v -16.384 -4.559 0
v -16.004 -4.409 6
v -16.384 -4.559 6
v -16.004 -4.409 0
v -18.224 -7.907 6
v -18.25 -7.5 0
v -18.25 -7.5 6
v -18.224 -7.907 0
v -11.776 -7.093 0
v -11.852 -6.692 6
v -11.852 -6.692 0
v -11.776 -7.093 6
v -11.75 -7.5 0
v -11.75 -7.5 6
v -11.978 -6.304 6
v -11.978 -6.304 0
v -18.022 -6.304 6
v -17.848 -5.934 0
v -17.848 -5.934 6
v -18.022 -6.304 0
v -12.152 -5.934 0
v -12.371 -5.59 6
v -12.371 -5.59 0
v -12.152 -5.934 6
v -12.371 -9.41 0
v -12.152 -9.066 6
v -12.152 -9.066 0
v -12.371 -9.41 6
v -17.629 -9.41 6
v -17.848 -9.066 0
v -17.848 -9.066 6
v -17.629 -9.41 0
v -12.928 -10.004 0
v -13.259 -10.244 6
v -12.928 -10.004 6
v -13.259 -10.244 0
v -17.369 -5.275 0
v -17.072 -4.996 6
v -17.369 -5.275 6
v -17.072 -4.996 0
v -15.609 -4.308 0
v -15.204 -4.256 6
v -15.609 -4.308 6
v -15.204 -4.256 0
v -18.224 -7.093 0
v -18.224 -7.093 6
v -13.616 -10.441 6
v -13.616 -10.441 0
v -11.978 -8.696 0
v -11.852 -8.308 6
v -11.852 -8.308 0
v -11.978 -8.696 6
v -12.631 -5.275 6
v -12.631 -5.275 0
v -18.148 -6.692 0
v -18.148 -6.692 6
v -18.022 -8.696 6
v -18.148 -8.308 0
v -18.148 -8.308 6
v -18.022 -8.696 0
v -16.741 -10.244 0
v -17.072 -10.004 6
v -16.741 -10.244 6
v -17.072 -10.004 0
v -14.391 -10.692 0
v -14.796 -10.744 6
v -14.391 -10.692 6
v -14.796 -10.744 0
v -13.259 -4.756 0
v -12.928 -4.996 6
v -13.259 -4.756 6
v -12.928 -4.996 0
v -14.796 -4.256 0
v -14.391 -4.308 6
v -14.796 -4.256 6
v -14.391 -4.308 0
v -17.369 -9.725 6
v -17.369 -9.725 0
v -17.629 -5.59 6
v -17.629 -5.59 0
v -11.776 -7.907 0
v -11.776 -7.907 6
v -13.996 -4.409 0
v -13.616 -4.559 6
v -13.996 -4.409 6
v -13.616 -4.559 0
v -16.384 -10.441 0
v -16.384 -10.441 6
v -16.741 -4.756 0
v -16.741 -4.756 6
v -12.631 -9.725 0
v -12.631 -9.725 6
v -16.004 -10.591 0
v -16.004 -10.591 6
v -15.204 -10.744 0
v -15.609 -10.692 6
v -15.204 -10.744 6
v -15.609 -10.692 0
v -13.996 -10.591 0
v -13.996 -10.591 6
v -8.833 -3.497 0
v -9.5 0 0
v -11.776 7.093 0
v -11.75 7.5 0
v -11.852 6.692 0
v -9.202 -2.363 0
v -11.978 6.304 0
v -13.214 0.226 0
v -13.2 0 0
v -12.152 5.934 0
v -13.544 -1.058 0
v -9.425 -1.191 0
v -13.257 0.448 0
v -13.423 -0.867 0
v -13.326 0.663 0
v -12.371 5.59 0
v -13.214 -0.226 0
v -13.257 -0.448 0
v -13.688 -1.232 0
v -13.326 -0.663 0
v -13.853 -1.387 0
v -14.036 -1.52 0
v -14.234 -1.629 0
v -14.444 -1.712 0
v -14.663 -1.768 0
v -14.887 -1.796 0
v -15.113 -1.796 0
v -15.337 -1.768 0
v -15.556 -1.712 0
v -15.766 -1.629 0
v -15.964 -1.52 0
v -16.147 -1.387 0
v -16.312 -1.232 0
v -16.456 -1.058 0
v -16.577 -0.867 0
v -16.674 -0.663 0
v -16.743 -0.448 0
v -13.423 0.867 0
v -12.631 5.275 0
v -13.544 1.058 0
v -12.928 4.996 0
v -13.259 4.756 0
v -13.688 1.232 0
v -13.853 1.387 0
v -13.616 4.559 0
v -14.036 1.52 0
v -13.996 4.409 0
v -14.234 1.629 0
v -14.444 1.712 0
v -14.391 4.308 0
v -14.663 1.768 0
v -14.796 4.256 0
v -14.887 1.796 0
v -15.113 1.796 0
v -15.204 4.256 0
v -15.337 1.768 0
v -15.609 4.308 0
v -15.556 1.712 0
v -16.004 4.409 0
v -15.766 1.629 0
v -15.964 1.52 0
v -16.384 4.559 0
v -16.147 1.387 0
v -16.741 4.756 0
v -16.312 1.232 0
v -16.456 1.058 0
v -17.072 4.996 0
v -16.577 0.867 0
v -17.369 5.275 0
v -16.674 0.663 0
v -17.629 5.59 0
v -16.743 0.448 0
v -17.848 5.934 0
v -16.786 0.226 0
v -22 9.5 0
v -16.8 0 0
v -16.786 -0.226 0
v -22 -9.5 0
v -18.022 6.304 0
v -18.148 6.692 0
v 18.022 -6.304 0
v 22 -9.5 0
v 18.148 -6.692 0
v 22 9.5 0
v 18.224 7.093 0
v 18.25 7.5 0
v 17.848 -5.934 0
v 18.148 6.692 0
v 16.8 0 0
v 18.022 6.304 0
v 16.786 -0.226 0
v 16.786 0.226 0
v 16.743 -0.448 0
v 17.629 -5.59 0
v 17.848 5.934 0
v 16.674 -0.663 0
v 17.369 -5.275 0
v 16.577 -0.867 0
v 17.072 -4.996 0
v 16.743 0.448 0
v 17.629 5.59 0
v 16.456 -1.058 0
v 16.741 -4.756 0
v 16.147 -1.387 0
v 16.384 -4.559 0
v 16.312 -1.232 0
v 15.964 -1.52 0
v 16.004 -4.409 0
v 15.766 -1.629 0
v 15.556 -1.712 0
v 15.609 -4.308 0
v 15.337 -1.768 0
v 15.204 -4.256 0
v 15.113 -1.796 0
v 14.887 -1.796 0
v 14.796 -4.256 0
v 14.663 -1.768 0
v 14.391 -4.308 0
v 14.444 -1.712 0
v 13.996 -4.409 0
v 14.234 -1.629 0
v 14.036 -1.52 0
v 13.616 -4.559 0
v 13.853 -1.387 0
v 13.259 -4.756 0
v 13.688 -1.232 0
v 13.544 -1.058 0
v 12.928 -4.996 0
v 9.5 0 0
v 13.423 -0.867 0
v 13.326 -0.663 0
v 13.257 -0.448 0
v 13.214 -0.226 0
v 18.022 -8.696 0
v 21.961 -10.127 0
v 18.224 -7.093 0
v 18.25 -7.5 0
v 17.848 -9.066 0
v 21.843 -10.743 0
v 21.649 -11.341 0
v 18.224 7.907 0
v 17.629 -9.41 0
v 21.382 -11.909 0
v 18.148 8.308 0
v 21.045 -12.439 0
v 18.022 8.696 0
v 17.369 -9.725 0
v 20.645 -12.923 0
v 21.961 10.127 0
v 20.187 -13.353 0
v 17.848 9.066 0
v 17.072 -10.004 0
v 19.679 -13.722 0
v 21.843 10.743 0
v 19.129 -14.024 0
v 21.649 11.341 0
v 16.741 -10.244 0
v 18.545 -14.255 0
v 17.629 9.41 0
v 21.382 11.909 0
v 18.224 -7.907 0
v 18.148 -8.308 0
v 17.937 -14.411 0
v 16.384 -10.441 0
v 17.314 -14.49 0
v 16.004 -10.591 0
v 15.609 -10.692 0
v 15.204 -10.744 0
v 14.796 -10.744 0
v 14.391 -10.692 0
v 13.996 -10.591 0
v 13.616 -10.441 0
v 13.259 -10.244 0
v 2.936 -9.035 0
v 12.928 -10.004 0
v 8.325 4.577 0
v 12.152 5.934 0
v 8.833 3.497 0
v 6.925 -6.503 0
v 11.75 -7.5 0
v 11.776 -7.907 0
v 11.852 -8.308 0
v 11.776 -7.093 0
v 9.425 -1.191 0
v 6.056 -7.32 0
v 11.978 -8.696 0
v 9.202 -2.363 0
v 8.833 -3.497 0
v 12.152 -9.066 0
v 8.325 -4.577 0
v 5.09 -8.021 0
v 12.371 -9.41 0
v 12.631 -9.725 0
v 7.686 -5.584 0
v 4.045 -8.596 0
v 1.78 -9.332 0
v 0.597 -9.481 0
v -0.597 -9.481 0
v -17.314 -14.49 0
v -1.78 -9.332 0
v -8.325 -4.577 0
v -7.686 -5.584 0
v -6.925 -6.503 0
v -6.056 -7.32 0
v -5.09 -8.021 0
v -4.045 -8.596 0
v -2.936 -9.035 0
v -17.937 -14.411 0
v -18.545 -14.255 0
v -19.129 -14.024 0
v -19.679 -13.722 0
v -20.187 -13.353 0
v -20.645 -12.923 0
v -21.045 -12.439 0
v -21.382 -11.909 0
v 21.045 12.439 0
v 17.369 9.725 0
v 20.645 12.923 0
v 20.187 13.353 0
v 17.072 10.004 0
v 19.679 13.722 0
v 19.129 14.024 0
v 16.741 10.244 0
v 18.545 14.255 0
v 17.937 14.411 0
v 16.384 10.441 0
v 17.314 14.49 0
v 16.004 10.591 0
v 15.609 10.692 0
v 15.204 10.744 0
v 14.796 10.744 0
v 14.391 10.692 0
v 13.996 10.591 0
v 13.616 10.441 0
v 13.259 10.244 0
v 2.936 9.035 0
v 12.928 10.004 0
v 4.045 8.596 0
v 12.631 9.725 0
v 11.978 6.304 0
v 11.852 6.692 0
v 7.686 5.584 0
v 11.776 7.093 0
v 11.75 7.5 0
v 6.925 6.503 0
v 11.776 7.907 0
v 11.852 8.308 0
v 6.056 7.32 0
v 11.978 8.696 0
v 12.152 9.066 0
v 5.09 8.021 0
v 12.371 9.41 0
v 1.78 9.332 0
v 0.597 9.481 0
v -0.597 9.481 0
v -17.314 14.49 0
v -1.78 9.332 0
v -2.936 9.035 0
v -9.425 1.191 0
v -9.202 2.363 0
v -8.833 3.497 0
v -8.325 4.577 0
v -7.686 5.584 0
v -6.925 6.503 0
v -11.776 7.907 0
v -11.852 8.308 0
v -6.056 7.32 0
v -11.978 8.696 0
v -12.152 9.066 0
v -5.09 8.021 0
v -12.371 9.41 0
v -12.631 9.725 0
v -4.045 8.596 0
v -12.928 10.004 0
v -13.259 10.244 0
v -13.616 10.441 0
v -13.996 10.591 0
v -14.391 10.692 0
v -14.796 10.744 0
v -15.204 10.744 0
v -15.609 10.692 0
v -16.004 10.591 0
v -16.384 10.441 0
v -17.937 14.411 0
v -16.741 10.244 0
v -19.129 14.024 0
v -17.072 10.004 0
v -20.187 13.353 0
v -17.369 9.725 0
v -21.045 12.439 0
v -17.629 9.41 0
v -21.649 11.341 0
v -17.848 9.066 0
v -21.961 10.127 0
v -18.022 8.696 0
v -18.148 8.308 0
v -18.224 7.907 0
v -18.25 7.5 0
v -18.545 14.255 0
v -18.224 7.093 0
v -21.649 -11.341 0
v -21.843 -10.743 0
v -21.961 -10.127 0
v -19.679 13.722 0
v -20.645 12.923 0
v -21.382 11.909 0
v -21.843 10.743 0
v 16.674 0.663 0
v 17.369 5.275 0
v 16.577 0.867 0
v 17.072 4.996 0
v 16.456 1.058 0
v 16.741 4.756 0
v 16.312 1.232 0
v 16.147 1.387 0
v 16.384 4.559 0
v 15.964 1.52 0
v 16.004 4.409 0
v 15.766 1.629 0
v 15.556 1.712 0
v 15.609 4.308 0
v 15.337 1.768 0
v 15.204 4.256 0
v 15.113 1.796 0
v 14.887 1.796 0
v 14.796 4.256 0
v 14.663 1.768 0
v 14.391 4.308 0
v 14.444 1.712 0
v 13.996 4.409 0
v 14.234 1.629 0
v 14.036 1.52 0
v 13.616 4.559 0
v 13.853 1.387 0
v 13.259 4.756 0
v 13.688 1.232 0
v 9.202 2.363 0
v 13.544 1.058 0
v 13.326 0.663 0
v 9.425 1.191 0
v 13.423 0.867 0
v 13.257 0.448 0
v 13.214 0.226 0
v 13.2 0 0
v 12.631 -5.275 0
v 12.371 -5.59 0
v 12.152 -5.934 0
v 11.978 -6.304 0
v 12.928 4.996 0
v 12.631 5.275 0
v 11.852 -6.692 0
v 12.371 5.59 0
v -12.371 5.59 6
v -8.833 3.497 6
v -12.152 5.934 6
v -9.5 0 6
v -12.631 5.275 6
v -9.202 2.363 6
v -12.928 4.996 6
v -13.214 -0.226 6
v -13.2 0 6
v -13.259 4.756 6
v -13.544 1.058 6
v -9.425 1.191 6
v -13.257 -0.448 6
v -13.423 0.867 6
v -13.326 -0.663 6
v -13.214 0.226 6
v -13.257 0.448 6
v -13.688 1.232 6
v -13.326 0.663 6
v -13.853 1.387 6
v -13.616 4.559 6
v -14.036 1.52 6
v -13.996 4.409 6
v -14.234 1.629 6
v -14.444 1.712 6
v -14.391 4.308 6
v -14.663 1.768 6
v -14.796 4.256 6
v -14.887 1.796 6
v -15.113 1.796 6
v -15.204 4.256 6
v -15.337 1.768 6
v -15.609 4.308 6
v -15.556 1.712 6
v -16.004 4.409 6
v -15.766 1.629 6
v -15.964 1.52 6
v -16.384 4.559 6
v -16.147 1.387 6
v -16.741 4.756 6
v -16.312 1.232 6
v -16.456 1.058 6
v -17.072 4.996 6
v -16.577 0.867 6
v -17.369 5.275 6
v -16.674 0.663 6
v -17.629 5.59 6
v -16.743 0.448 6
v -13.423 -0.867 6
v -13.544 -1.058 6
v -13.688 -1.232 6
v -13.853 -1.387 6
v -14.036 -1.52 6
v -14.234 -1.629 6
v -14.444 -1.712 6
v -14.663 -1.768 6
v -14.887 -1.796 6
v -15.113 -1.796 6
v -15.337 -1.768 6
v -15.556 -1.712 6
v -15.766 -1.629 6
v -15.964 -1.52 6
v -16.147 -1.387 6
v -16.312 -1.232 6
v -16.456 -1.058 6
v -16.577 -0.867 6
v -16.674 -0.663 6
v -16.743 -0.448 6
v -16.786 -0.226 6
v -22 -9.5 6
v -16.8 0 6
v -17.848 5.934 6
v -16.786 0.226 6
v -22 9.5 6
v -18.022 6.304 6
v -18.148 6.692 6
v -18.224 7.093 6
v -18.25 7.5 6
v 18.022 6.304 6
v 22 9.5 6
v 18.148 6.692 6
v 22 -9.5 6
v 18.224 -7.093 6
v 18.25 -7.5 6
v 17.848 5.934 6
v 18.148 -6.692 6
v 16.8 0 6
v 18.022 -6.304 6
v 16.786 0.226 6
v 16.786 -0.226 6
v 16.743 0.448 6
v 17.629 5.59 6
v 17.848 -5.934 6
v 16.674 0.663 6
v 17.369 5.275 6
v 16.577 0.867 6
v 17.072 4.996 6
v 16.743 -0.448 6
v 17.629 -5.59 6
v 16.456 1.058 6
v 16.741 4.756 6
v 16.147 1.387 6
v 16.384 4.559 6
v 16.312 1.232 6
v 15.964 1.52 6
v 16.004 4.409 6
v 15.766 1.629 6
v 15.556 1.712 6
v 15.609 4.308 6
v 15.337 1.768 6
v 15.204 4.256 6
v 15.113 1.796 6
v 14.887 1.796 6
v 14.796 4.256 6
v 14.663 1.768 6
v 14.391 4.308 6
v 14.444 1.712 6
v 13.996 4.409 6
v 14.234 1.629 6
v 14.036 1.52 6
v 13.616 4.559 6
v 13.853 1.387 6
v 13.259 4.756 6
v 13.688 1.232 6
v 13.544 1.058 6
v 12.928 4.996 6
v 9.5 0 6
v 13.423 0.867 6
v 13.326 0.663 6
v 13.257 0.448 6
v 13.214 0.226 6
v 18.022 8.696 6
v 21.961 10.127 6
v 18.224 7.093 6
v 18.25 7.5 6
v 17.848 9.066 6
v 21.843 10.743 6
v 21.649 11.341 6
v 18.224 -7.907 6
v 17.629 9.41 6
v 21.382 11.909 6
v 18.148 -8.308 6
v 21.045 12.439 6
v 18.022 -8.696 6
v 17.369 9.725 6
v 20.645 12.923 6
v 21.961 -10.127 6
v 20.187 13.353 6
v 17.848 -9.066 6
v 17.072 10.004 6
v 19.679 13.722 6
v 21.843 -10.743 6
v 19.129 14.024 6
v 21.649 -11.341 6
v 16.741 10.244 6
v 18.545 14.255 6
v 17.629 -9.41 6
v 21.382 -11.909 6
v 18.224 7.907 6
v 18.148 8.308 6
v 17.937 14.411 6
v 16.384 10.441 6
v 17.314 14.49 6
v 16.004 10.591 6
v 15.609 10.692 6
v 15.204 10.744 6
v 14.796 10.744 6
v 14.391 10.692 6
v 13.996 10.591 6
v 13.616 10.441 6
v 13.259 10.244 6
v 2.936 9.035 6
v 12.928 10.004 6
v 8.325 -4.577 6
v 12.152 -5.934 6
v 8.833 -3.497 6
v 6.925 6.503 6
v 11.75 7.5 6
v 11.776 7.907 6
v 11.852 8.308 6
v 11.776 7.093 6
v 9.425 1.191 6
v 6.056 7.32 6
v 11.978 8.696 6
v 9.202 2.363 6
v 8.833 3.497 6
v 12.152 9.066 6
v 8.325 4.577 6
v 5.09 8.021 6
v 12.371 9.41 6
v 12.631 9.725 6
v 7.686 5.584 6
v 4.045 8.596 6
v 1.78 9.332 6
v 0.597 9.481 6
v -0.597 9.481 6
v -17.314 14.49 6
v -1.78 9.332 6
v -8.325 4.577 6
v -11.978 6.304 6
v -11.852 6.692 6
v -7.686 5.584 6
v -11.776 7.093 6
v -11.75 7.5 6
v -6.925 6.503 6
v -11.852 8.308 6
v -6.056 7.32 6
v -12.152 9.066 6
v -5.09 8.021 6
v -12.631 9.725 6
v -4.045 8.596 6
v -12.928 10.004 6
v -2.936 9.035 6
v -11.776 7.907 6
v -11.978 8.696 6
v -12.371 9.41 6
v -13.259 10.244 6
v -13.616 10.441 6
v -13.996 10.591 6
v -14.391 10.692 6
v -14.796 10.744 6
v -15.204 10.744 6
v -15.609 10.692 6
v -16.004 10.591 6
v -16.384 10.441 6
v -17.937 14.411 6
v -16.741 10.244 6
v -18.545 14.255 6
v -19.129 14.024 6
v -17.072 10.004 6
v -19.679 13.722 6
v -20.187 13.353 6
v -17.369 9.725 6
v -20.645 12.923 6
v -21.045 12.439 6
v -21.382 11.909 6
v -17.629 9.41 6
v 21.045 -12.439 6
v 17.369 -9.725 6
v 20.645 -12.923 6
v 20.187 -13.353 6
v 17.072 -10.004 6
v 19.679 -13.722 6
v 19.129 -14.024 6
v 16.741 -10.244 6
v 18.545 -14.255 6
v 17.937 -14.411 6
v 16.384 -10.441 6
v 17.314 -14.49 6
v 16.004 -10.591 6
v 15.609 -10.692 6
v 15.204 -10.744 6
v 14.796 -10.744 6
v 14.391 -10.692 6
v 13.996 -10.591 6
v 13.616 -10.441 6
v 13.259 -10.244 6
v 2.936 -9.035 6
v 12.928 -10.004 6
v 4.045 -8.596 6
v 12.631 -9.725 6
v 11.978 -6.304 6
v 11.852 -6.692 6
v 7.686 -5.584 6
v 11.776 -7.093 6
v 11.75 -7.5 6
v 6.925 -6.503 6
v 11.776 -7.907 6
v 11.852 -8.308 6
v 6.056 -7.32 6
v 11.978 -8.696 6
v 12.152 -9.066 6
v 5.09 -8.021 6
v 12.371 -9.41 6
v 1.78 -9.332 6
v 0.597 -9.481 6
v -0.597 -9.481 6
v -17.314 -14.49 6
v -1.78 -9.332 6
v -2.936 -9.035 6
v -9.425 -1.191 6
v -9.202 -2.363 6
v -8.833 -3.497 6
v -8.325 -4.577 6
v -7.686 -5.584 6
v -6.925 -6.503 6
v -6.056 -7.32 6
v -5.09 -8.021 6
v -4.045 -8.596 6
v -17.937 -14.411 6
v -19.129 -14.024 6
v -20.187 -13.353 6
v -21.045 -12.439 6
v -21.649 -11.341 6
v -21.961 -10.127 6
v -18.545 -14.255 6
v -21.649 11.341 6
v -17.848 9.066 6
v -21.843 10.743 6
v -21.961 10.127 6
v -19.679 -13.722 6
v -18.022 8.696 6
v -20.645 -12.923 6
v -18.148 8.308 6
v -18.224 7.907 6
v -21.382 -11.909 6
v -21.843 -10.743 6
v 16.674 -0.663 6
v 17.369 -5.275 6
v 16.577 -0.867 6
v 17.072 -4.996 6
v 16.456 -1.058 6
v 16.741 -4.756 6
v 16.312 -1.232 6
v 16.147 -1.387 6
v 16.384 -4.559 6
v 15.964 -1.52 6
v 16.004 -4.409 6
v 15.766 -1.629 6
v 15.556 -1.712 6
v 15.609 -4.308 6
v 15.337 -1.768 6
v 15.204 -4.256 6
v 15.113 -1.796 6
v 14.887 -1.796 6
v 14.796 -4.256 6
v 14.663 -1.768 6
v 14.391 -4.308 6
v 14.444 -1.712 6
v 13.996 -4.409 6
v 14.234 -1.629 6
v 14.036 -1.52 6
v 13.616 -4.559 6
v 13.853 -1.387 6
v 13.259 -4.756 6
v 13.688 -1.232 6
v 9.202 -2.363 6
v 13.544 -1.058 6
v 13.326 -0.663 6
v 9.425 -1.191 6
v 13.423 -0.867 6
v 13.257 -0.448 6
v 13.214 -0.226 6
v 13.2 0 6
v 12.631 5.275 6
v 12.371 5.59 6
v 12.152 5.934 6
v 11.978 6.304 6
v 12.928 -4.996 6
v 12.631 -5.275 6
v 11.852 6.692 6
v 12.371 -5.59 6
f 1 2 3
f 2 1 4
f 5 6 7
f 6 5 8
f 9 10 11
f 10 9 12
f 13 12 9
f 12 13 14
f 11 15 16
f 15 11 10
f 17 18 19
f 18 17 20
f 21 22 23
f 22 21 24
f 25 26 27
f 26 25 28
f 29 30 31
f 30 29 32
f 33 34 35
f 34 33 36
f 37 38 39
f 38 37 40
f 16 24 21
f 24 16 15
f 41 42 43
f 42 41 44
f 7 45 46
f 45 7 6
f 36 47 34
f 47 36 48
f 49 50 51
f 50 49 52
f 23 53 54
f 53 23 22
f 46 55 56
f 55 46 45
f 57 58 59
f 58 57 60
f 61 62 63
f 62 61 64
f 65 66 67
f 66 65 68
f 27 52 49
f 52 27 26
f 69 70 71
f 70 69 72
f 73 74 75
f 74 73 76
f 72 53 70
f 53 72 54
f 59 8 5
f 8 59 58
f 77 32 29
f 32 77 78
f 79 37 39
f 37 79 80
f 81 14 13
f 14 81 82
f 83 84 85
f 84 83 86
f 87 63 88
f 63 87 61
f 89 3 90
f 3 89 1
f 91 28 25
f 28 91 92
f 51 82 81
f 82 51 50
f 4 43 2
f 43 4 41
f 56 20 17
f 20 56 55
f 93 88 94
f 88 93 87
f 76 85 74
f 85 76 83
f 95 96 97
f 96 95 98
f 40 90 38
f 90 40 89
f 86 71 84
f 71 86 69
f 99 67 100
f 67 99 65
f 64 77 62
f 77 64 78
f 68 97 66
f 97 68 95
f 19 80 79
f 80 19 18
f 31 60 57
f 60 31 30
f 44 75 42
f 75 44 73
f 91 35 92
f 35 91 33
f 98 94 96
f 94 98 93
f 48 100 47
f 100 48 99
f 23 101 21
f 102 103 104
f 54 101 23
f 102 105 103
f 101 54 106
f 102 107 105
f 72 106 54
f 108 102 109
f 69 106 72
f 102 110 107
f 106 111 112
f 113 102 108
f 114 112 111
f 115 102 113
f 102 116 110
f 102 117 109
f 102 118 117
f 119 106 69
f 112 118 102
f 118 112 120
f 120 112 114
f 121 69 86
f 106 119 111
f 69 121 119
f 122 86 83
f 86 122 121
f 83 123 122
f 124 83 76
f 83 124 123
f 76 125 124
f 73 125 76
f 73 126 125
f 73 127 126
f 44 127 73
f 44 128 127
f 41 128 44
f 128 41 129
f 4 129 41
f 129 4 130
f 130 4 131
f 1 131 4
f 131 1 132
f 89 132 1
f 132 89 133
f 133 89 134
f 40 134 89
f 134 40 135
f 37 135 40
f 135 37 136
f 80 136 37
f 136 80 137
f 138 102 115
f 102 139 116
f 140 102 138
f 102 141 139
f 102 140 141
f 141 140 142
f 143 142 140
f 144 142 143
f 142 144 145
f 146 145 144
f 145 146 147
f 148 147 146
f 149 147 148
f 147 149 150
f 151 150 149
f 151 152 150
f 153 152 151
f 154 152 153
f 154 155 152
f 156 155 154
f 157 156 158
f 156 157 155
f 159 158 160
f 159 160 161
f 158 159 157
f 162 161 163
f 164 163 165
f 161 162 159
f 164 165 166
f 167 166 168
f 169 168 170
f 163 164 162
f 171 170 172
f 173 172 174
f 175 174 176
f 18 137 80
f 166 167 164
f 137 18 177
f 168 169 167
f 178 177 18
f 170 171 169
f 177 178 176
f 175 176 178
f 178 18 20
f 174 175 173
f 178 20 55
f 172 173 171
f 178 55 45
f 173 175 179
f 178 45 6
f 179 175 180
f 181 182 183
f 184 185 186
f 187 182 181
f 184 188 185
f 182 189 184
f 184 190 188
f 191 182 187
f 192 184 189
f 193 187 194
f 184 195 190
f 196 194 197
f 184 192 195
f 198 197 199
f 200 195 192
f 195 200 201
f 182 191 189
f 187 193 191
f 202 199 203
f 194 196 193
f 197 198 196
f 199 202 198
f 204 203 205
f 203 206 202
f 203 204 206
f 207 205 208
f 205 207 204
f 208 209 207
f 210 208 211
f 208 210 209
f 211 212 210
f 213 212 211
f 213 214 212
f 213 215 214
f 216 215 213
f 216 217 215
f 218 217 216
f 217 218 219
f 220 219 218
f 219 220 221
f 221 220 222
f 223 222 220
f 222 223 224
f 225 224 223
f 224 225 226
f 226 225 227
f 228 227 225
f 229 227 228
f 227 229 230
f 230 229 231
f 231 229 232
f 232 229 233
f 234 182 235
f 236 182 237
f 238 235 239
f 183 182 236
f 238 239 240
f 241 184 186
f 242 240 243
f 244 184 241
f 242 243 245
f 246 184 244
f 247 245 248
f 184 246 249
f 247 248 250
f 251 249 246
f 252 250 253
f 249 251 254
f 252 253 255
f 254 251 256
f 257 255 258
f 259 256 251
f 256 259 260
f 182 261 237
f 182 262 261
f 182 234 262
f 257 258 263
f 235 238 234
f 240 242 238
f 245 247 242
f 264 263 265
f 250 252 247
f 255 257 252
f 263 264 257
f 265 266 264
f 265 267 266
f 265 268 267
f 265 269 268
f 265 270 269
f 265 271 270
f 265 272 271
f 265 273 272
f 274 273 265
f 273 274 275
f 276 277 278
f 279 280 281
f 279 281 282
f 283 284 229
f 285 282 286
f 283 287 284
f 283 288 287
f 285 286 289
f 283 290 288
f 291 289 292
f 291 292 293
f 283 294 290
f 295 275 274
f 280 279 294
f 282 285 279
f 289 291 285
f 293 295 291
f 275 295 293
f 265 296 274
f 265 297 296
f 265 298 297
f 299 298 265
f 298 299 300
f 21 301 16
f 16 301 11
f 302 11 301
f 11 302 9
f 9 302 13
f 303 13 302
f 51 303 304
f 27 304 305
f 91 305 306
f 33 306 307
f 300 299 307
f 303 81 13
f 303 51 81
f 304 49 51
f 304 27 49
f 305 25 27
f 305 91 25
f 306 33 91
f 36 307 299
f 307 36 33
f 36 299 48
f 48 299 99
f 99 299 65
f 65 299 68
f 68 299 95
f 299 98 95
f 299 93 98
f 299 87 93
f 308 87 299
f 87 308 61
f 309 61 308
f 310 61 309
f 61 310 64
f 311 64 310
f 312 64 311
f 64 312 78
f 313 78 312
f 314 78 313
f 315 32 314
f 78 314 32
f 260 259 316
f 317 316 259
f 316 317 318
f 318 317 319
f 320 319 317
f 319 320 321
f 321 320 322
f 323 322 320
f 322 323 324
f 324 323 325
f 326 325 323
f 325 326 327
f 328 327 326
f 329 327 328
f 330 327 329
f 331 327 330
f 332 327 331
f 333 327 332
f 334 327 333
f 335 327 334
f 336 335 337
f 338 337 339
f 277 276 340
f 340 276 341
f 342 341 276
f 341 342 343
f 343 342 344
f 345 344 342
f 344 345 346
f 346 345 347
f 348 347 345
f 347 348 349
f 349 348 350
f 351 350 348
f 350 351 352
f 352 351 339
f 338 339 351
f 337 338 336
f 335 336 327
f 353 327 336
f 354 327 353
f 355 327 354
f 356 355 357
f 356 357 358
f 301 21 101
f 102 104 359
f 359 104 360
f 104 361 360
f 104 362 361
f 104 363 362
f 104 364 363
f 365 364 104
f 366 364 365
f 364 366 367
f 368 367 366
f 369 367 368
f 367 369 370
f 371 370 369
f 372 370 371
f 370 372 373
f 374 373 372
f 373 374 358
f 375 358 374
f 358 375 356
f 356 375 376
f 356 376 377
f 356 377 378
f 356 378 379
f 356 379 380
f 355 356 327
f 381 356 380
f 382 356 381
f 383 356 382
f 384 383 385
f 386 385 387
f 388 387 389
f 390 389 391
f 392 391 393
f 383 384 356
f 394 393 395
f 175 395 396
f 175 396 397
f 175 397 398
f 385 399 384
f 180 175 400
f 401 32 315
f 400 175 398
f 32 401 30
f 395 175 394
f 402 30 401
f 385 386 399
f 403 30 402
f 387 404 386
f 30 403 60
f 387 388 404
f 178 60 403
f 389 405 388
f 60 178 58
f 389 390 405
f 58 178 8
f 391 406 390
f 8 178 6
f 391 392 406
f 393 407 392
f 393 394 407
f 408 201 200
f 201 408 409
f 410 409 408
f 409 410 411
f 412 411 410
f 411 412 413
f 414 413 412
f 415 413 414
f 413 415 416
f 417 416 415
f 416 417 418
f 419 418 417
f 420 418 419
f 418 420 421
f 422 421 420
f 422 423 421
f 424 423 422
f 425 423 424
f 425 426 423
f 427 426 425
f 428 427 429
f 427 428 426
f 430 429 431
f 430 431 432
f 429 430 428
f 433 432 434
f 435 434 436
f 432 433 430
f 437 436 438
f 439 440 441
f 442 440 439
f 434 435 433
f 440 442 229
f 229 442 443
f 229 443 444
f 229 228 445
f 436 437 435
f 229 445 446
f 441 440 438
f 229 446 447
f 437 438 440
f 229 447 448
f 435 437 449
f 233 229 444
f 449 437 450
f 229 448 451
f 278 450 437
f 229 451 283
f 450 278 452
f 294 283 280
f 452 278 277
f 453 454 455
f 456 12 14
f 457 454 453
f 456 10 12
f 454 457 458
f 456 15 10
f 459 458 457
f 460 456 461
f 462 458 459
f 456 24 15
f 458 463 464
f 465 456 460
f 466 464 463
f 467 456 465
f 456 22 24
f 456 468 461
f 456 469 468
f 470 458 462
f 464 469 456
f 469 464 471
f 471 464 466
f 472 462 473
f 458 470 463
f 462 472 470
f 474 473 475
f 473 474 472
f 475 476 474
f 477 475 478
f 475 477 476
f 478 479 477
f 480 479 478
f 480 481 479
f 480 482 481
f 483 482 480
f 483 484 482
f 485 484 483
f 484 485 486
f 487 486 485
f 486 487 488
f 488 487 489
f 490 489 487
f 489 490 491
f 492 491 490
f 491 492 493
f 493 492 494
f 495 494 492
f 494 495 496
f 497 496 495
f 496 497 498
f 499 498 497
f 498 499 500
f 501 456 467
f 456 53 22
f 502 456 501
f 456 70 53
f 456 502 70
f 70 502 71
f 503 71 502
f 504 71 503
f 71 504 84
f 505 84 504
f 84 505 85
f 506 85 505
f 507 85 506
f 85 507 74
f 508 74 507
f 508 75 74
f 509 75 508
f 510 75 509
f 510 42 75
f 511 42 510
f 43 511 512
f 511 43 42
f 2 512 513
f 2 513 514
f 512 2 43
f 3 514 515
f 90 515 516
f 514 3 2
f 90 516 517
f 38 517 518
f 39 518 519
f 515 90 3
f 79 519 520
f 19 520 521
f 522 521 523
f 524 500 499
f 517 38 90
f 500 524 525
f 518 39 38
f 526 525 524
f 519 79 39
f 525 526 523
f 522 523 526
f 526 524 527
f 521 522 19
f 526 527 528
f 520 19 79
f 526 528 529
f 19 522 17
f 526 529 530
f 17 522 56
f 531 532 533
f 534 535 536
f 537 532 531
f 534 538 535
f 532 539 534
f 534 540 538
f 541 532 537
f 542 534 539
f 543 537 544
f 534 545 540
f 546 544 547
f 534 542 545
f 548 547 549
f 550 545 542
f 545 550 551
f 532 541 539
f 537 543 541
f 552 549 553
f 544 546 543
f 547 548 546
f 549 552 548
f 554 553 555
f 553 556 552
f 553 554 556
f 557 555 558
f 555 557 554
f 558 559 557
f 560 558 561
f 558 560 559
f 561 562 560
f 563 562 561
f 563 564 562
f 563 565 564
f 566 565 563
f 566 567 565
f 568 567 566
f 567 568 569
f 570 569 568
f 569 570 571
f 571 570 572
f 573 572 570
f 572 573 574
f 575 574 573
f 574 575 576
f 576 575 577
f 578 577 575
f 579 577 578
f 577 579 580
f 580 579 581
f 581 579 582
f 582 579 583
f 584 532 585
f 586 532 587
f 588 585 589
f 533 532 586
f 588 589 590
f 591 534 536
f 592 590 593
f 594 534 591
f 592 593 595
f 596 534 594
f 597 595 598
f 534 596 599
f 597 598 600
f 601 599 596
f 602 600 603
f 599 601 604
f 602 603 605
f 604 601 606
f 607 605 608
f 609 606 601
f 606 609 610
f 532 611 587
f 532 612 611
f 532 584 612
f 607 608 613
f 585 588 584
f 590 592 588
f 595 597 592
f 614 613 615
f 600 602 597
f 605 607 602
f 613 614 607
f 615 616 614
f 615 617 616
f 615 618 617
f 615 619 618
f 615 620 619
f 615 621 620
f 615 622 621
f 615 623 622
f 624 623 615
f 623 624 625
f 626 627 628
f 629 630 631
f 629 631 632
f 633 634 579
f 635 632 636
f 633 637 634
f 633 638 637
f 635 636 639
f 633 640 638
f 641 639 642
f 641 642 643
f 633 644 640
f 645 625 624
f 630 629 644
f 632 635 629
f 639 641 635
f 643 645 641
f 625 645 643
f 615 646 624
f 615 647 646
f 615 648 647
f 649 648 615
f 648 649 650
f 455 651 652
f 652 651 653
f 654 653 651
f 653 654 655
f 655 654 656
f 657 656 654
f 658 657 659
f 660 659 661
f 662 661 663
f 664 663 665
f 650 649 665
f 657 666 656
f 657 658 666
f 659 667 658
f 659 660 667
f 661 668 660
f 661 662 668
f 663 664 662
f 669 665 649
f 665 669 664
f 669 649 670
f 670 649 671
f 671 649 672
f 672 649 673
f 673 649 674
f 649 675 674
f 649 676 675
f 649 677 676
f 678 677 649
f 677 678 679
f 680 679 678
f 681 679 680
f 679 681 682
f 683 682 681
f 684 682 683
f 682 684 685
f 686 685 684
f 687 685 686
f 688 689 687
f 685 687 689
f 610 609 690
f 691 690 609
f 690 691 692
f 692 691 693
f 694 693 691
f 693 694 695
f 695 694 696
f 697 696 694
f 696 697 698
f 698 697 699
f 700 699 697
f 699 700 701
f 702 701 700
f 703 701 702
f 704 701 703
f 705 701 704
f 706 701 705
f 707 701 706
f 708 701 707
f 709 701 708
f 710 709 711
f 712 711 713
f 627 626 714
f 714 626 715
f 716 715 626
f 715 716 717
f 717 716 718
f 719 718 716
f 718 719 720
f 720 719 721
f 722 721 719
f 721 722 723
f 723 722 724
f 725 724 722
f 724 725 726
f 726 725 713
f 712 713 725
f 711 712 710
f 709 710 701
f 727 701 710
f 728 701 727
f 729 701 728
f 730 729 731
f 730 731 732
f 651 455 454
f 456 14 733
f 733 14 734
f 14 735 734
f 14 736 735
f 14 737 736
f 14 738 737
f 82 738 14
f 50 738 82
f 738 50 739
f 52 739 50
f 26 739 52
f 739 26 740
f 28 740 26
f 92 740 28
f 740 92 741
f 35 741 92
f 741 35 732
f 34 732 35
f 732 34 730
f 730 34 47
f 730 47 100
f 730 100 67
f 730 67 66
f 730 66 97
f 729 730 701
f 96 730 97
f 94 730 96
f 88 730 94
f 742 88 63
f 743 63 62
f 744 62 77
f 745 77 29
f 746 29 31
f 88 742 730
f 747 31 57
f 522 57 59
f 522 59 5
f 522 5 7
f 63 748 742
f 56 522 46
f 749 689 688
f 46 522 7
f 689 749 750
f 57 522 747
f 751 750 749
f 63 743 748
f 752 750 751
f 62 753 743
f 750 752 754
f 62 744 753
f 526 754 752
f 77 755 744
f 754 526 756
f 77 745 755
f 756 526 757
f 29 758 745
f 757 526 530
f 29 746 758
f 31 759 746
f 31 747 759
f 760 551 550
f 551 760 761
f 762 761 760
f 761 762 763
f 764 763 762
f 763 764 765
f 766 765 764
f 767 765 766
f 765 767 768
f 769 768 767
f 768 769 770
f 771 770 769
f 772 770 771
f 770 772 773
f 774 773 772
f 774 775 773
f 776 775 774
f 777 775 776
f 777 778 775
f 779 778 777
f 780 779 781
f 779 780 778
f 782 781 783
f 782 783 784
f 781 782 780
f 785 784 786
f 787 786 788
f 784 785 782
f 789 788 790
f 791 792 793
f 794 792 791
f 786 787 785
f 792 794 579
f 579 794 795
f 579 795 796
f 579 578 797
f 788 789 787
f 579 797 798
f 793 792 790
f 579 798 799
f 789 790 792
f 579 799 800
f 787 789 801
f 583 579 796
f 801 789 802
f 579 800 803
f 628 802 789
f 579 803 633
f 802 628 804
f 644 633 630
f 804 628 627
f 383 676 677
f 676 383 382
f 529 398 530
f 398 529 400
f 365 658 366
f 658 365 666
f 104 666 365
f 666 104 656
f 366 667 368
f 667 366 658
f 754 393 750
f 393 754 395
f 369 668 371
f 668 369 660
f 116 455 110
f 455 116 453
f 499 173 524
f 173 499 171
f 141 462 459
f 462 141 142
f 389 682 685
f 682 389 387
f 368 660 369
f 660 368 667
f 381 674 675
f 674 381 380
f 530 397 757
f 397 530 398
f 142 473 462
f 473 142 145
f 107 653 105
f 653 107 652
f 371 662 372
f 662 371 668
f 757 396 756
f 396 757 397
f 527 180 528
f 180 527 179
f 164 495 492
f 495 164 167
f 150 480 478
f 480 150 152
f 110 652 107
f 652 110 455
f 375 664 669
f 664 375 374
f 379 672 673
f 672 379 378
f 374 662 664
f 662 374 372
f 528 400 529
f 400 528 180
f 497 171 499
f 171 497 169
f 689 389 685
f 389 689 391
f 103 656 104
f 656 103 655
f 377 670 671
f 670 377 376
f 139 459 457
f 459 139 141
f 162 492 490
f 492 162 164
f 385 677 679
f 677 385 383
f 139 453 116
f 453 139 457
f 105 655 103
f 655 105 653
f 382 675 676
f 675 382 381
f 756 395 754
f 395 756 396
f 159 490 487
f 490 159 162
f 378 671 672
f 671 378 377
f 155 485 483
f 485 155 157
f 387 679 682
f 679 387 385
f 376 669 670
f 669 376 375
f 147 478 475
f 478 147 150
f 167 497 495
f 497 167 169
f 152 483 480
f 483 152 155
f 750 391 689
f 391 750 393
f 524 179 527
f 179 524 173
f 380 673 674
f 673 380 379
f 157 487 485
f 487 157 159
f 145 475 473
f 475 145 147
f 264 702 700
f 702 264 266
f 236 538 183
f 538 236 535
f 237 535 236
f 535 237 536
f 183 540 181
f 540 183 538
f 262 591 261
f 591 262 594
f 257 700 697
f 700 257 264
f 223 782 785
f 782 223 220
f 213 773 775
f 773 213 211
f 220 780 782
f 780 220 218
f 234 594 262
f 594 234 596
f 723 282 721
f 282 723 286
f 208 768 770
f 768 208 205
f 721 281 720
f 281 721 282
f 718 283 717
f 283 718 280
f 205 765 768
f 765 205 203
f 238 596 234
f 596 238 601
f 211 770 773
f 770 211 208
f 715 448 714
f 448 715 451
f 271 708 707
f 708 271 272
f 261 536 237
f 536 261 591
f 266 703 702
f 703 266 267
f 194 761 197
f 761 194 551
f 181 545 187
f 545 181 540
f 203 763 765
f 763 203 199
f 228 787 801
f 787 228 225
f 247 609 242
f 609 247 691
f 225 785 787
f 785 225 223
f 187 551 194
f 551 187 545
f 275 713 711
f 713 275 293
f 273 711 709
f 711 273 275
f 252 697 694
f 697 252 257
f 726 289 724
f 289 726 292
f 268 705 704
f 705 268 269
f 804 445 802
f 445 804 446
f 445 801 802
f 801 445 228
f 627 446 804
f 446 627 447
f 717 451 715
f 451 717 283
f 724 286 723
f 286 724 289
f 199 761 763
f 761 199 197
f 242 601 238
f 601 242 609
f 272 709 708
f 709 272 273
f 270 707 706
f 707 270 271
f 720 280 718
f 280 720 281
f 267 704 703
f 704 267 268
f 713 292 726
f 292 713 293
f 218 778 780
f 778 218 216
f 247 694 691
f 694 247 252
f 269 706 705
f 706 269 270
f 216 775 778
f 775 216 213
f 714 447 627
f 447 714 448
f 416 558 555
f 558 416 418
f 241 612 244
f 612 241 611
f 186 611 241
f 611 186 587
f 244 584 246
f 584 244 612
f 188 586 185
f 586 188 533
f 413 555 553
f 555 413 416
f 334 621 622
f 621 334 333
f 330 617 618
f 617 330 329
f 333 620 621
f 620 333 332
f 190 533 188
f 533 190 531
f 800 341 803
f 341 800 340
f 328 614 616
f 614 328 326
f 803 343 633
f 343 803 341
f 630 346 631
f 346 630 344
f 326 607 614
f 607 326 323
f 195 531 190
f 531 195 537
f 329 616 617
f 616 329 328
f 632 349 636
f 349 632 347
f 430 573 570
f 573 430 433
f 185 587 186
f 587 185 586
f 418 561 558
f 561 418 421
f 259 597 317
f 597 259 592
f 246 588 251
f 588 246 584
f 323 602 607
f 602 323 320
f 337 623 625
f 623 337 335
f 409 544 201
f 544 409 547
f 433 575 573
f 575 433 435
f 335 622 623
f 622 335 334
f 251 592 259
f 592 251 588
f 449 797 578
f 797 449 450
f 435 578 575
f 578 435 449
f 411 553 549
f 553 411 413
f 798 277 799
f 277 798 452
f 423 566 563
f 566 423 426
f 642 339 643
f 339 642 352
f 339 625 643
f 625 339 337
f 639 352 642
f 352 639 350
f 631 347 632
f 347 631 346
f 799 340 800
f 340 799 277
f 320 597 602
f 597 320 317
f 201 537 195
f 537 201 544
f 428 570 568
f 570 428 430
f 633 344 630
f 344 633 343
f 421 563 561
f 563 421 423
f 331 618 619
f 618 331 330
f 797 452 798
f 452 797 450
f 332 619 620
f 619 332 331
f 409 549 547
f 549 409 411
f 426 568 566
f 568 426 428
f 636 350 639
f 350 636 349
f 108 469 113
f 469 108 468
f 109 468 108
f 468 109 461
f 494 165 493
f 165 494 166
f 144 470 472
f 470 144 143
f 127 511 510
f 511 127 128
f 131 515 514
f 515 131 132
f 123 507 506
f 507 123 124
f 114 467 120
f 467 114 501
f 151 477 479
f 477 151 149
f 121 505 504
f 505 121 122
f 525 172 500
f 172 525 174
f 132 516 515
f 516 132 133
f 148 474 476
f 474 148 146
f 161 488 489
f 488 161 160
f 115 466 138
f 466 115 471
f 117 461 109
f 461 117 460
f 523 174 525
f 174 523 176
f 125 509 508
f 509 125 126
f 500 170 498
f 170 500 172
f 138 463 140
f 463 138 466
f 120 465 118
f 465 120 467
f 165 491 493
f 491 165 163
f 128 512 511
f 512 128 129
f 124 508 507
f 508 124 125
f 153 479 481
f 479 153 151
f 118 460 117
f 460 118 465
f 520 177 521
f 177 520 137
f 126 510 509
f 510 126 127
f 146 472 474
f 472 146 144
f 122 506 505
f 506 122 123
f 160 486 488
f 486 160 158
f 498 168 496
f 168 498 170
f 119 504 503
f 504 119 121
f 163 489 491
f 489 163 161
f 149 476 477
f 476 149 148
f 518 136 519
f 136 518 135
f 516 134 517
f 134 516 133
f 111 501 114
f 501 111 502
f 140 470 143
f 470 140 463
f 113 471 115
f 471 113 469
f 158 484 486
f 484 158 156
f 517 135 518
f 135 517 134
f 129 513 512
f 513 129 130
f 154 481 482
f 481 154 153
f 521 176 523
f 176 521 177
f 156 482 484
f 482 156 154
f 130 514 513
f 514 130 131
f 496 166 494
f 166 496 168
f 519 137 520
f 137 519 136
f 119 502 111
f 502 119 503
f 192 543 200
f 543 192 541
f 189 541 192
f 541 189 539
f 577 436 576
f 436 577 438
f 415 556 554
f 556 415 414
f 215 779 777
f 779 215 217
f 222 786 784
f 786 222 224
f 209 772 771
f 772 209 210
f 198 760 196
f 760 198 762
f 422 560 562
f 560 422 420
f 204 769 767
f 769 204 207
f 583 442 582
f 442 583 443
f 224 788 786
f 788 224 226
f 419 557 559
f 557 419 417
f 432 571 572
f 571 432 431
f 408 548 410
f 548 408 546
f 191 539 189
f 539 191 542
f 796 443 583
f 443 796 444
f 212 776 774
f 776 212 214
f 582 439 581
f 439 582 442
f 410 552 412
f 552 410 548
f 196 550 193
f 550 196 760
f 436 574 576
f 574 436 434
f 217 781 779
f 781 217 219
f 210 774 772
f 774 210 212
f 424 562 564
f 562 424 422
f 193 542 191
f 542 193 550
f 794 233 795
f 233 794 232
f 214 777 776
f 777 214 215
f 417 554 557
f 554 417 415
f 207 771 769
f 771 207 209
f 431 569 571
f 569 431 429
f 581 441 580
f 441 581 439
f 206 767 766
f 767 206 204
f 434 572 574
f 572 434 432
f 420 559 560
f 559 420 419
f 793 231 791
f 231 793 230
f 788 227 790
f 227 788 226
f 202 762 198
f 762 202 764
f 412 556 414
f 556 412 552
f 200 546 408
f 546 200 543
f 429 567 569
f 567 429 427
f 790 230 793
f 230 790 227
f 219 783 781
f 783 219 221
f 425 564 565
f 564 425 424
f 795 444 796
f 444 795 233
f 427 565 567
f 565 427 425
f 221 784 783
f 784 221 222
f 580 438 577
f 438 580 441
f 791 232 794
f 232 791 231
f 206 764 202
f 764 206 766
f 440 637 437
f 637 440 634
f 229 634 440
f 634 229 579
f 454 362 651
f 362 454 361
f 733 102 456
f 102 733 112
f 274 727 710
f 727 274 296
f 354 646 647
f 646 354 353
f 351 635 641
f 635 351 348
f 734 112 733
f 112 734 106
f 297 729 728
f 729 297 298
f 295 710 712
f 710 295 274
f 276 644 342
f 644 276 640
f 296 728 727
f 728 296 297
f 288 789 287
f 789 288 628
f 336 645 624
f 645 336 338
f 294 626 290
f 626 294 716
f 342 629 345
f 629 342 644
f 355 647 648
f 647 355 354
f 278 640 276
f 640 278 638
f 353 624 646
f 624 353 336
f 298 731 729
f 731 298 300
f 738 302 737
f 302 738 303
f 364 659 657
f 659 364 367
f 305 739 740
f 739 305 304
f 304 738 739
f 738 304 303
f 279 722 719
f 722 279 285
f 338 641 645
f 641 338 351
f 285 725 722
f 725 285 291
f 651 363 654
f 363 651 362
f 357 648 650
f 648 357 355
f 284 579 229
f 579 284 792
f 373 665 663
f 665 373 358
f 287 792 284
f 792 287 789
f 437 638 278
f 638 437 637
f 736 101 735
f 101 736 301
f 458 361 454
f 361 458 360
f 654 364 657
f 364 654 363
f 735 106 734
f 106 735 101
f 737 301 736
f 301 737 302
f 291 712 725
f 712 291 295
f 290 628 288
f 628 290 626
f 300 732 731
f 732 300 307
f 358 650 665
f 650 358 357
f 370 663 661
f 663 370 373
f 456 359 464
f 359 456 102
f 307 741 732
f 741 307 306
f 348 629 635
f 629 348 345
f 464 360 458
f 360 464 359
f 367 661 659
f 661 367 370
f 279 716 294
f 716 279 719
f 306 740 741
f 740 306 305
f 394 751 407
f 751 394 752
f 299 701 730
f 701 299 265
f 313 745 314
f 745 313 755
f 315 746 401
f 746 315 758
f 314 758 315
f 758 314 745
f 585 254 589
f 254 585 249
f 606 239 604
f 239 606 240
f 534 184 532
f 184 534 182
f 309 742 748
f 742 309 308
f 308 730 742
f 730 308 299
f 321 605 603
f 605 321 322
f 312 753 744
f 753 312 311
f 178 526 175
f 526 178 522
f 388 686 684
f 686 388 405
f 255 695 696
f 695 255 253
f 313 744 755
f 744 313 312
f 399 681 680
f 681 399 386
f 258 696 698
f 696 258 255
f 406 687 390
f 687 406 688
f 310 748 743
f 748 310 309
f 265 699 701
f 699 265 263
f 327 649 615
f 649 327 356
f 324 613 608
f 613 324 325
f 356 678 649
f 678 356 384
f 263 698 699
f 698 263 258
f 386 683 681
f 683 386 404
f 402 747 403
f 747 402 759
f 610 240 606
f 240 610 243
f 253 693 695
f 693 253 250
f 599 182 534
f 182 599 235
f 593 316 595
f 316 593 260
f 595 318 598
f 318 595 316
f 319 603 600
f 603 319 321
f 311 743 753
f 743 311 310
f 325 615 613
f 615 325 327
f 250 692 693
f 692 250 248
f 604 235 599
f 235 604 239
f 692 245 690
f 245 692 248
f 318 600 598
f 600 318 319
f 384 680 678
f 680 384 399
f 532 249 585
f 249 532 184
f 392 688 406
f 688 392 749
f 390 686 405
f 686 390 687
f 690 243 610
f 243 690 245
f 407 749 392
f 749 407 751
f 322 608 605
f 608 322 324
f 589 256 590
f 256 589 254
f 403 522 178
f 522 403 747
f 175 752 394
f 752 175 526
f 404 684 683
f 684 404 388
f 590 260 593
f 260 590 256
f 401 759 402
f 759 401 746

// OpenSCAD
$fn = 50;

difference() {
	union() {
		hull() {
			translate(v = [-17.0, 9.5, 0]) {
				cylinder(h = 6, r = 5);
			}
			translate(v = [17.0, 9.5, 0]) {
				cylinder(h = 6, r = 5);
			}
			translate(v = [-17.0, -9.5, 0]) {
				cylinder(h = 6, r = 5);
			}
			translate(v = [17.0, -9.5, 0]) {
				cylinder(h = 6, r = 5);
			}
		}
	}
	union() {
		translate(v = [-15.0, -7.5, 0]) {
			cylinder(h = 6, r = 3.25);
		}
		translate(v = [-15.0, 7.5, 0]) {
			cylinder(h = 6, r = 3.25);
		}
		translate(v = [15.0, -7.5, 0]) {
			cylinder(h = 6, r = 3.25);
		}
		translate(v = [15.0, 7.5, 0]) {
			cylinder(h = 6, r = 3.25);
		}
		translate(v = [-15.0, 0.0, 0]) {
			cylinder(h = 6, r = 1.8);
		}
		translate(v = [15.0, 0.0, 0]) {
			cylinder(h = 6, r = 1.8);
		}
		cylinder(h = 6, r = 9.5);
	}
}
